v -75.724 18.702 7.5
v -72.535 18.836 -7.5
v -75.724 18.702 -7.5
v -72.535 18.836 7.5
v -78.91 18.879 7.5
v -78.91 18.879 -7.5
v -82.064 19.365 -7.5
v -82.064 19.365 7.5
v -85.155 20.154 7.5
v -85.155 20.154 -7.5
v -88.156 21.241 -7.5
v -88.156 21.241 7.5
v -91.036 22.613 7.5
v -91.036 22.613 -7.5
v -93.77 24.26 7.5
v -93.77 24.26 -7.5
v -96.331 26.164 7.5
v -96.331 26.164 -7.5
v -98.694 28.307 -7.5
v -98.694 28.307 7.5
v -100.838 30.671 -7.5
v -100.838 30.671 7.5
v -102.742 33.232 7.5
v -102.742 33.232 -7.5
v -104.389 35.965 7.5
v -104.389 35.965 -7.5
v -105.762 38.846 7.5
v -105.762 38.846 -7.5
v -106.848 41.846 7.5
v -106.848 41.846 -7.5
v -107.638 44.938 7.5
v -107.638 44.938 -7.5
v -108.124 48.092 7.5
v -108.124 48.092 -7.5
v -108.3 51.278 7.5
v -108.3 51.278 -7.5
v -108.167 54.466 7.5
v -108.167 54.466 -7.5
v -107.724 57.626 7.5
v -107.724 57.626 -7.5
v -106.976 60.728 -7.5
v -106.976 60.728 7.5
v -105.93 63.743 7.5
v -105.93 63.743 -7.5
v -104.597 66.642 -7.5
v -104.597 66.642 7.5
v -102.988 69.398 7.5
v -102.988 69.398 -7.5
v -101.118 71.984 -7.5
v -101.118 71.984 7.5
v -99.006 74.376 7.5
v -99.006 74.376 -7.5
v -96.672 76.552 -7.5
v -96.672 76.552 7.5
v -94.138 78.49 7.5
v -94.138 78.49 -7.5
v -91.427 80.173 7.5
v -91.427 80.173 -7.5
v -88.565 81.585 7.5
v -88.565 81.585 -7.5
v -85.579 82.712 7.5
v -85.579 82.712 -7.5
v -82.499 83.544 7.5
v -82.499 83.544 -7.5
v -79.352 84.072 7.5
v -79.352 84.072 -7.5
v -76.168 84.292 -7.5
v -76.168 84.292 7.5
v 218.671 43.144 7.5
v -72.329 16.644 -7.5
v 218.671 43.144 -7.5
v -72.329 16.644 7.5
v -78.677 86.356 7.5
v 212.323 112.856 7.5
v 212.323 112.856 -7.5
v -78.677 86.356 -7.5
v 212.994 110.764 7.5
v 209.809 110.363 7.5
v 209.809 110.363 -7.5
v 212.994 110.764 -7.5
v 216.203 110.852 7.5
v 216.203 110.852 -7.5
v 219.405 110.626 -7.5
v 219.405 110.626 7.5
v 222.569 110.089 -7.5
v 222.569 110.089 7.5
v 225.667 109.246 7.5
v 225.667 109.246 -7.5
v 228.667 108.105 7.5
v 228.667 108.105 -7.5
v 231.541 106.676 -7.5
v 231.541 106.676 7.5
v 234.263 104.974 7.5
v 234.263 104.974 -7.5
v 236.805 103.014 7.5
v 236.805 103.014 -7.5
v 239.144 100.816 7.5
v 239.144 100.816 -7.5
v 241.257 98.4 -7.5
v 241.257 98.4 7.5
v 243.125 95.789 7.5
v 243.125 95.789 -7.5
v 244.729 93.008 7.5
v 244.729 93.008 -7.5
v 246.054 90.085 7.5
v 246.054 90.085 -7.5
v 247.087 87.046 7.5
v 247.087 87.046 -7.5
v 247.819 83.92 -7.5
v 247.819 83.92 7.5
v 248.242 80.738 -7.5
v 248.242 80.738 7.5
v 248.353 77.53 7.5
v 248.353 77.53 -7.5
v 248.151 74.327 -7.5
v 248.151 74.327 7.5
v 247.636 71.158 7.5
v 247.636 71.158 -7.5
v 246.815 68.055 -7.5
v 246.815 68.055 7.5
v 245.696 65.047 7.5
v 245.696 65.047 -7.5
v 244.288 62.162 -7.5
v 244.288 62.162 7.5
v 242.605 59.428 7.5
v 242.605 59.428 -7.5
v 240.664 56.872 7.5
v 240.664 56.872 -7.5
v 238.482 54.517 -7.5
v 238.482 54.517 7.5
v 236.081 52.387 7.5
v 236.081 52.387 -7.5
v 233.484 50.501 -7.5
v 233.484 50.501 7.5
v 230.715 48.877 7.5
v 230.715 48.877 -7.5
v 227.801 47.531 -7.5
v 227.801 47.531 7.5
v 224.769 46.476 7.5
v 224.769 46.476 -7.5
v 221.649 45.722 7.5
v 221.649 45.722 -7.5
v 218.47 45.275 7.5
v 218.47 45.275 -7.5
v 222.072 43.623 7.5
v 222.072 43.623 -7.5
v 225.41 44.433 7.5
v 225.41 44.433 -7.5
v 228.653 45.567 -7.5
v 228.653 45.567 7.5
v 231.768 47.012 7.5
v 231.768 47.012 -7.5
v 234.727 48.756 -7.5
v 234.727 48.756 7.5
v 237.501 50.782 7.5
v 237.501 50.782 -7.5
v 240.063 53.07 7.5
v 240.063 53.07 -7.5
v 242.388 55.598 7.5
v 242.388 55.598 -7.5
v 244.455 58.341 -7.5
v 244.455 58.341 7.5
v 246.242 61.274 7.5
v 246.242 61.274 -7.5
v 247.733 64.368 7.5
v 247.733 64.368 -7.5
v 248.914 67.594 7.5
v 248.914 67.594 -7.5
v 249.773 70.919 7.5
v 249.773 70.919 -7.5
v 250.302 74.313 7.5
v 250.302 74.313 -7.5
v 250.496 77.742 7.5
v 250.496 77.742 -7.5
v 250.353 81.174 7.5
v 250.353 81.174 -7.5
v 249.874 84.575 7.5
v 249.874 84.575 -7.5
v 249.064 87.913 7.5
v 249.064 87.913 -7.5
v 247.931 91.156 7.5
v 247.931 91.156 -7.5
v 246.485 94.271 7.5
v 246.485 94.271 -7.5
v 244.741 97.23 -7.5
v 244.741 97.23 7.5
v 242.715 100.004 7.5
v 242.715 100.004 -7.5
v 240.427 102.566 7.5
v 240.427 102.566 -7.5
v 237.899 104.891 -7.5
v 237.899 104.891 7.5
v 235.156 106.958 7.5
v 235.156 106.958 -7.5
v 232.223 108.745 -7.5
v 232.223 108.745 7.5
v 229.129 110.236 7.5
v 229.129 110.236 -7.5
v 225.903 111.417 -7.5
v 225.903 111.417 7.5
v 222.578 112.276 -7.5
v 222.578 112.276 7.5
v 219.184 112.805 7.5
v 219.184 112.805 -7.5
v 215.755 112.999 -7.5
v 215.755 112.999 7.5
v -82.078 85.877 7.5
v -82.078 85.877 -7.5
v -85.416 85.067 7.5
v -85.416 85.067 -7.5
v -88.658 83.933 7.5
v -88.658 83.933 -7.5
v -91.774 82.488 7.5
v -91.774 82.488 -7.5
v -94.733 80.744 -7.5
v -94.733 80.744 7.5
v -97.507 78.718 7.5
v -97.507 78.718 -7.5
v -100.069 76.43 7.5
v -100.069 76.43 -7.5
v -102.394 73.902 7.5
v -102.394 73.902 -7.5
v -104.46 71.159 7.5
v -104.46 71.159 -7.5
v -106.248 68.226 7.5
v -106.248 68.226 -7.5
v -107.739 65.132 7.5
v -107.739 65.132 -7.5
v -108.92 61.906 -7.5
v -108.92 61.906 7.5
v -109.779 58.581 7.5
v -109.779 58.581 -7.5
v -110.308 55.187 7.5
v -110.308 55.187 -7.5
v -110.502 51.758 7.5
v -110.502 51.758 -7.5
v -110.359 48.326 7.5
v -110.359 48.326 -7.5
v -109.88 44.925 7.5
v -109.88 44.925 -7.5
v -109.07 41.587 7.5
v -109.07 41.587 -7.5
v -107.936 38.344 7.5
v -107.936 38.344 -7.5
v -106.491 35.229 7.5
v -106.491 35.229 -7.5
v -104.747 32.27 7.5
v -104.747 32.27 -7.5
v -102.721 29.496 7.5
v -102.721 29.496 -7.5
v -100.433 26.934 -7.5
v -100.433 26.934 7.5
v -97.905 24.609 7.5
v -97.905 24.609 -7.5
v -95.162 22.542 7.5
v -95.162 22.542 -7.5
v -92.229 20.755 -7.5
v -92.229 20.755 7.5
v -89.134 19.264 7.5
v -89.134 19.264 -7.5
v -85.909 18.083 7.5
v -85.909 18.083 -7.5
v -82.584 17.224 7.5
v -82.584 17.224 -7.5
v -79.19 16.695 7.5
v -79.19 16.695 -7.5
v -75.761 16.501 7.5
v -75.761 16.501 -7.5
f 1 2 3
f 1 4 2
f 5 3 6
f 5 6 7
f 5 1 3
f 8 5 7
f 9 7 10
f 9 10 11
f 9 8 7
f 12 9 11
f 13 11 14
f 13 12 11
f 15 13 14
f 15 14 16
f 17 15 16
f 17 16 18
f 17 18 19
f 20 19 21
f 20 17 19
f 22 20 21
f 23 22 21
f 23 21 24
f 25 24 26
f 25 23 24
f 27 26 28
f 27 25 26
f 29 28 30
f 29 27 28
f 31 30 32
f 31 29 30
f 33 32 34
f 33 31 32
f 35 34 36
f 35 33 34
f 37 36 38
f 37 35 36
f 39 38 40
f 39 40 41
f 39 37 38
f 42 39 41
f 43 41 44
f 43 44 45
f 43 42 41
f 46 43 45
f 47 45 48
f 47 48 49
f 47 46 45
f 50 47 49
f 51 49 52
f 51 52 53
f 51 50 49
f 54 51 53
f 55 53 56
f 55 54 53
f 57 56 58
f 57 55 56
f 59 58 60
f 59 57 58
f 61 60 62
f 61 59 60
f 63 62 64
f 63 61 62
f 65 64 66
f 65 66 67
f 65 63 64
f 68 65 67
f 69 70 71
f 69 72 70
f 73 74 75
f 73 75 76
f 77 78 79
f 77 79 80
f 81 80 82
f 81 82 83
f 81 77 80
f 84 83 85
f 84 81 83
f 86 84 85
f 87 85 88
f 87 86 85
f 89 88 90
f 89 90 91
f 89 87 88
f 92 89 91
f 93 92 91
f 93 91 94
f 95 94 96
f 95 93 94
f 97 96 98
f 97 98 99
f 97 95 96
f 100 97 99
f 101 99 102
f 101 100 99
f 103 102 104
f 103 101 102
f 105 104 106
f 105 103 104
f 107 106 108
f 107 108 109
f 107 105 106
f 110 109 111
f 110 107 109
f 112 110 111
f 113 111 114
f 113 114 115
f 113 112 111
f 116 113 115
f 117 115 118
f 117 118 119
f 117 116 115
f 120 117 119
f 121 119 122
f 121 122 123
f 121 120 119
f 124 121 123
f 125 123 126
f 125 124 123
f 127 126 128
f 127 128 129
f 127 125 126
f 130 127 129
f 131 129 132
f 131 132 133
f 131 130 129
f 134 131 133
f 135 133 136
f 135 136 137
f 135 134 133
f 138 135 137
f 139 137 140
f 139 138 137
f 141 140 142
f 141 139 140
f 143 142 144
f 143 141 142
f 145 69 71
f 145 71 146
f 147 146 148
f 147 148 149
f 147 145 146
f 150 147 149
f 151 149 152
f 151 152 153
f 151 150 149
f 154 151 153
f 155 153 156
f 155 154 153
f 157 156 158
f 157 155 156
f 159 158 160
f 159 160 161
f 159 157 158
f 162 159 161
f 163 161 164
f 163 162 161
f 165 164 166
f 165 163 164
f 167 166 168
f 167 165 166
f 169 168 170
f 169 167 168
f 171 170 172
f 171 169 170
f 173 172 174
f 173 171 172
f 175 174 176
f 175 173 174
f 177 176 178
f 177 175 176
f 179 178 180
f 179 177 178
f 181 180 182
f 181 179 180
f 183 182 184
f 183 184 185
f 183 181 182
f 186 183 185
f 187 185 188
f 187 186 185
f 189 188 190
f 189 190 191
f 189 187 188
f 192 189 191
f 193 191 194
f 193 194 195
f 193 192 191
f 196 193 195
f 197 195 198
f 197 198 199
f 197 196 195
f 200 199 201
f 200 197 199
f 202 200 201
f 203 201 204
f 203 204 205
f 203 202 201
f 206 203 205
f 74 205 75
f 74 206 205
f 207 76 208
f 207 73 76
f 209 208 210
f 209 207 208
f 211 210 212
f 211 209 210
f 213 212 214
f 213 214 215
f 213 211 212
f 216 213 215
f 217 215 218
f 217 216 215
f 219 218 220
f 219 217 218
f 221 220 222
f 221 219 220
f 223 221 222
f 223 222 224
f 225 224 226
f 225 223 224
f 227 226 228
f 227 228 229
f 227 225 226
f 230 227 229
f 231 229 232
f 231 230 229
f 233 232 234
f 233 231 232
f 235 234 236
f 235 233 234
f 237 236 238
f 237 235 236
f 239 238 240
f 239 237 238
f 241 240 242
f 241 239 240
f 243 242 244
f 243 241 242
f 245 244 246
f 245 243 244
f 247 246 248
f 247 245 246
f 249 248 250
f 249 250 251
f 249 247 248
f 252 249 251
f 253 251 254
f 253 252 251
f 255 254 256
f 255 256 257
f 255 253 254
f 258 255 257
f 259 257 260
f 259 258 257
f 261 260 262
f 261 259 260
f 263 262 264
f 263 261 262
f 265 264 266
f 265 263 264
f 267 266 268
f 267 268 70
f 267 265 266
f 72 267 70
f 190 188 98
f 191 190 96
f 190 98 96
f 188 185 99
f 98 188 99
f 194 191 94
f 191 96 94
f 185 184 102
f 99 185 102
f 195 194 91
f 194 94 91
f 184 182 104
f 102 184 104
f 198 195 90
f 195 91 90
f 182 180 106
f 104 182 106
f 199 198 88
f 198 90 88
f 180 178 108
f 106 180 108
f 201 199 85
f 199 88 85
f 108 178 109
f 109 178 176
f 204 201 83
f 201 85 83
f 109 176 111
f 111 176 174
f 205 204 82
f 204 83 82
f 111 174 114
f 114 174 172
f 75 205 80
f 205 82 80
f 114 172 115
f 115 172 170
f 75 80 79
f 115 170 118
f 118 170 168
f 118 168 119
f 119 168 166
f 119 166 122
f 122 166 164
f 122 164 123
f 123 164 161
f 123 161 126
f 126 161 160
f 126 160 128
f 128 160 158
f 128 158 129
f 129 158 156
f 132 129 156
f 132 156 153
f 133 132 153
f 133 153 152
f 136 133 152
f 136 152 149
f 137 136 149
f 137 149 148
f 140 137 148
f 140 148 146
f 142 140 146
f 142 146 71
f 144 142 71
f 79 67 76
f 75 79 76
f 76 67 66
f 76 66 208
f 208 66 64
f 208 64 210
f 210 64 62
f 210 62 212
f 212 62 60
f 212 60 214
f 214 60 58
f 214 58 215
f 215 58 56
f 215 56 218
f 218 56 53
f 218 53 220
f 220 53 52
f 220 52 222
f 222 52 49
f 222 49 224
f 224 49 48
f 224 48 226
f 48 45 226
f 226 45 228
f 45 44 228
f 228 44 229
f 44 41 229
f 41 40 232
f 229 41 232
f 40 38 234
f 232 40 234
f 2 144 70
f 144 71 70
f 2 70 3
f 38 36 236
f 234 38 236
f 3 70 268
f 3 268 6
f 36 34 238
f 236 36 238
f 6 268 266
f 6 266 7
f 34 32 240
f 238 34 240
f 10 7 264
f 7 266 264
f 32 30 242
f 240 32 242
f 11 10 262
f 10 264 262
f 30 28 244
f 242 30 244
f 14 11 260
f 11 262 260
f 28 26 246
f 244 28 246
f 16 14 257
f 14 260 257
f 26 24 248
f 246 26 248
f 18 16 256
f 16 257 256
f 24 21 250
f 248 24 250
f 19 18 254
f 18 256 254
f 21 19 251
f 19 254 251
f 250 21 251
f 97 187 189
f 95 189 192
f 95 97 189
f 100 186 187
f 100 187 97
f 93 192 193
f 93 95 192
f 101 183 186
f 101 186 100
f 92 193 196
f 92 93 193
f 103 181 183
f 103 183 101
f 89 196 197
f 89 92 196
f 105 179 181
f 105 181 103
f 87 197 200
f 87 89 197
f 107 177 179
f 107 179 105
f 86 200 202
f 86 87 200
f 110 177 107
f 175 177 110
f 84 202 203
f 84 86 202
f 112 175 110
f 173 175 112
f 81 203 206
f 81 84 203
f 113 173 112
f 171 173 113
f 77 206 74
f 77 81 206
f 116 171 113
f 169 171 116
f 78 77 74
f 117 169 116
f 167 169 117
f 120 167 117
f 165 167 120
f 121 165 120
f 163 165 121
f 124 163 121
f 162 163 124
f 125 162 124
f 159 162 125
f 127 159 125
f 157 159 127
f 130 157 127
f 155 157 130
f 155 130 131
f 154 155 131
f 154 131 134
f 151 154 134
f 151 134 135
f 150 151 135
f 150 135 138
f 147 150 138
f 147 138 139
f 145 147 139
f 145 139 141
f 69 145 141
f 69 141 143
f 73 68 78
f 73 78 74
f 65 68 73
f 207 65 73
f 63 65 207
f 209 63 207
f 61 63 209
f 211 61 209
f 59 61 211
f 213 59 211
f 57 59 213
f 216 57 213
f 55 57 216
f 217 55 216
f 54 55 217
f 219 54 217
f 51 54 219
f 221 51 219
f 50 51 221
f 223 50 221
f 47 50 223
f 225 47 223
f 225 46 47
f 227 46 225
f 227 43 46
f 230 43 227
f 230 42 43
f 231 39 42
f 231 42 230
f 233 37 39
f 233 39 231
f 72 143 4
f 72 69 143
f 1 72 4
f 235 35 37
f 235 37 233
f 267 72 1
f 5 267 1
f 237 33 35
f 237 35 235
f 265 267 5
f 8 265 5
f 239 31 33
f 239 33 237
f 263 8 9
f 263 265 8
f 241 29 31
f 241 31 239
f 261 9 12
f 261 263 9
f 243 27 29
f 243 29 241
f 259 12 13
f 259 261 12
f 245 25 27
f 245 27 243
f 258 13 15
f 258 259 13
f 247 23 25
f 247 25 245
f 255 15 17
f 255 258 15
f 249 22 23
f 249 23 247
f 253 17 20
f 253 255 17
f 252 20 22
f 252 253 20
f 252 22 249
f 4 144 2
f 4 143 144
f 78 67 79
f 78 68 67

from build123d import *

# Parameters (mm, degrees)
Y_KSEKLIK_EKSTR_ZYON1_DEPTH = 7.5


with BuildPart() as part:
    # Çizim1 → Yükseklik-Ekstrüzyon1 (new body, symmetric)
    with BuildSketch(Plane(origin=(0, 0, 0), x_dir=(-1, 0, 0), z_dir=(0, 0, 1))):
        with BuildLine():
            Line((72.328772259, -16.644229091), (-218.671227741, -43.144229091))
            ThreePointArc((-218.671227741, -43.144229091), (-250.352847691, -81.174150959), (-212.322925823, -112.855770909))
            Line((-212.322925823, -112.855770909), (78.677074177, -86.355770909))
            ThreePointArc((78.677074177, -86.355770909), (110.358694128, -48.325849041), (72.328772259, -16.644229091))
        make_face()
        with BuildLine():
            ThreePointArc((-209.8089095, -110.3633999), (-248.069420133, -82.334437532), (-218.470252737, -45.27531322))
            Line((-218.470252737, -45.27531322), (72.535281972, -18.836231788))
            ThreePointArc((72.535281972, -18.836231788), (108.250828228, -49.682483602), (76.168067869, -84.291557312))
            Line((76.168067869, -84.291557312), (-209.8089095, -110.3633999))
        make_face(mode=Mode.SUBTRACT)
    extrude(amount=Y_KSEKLIK_EKSTR_ZYON1_DEPTH, both=True)


solid = part.part
